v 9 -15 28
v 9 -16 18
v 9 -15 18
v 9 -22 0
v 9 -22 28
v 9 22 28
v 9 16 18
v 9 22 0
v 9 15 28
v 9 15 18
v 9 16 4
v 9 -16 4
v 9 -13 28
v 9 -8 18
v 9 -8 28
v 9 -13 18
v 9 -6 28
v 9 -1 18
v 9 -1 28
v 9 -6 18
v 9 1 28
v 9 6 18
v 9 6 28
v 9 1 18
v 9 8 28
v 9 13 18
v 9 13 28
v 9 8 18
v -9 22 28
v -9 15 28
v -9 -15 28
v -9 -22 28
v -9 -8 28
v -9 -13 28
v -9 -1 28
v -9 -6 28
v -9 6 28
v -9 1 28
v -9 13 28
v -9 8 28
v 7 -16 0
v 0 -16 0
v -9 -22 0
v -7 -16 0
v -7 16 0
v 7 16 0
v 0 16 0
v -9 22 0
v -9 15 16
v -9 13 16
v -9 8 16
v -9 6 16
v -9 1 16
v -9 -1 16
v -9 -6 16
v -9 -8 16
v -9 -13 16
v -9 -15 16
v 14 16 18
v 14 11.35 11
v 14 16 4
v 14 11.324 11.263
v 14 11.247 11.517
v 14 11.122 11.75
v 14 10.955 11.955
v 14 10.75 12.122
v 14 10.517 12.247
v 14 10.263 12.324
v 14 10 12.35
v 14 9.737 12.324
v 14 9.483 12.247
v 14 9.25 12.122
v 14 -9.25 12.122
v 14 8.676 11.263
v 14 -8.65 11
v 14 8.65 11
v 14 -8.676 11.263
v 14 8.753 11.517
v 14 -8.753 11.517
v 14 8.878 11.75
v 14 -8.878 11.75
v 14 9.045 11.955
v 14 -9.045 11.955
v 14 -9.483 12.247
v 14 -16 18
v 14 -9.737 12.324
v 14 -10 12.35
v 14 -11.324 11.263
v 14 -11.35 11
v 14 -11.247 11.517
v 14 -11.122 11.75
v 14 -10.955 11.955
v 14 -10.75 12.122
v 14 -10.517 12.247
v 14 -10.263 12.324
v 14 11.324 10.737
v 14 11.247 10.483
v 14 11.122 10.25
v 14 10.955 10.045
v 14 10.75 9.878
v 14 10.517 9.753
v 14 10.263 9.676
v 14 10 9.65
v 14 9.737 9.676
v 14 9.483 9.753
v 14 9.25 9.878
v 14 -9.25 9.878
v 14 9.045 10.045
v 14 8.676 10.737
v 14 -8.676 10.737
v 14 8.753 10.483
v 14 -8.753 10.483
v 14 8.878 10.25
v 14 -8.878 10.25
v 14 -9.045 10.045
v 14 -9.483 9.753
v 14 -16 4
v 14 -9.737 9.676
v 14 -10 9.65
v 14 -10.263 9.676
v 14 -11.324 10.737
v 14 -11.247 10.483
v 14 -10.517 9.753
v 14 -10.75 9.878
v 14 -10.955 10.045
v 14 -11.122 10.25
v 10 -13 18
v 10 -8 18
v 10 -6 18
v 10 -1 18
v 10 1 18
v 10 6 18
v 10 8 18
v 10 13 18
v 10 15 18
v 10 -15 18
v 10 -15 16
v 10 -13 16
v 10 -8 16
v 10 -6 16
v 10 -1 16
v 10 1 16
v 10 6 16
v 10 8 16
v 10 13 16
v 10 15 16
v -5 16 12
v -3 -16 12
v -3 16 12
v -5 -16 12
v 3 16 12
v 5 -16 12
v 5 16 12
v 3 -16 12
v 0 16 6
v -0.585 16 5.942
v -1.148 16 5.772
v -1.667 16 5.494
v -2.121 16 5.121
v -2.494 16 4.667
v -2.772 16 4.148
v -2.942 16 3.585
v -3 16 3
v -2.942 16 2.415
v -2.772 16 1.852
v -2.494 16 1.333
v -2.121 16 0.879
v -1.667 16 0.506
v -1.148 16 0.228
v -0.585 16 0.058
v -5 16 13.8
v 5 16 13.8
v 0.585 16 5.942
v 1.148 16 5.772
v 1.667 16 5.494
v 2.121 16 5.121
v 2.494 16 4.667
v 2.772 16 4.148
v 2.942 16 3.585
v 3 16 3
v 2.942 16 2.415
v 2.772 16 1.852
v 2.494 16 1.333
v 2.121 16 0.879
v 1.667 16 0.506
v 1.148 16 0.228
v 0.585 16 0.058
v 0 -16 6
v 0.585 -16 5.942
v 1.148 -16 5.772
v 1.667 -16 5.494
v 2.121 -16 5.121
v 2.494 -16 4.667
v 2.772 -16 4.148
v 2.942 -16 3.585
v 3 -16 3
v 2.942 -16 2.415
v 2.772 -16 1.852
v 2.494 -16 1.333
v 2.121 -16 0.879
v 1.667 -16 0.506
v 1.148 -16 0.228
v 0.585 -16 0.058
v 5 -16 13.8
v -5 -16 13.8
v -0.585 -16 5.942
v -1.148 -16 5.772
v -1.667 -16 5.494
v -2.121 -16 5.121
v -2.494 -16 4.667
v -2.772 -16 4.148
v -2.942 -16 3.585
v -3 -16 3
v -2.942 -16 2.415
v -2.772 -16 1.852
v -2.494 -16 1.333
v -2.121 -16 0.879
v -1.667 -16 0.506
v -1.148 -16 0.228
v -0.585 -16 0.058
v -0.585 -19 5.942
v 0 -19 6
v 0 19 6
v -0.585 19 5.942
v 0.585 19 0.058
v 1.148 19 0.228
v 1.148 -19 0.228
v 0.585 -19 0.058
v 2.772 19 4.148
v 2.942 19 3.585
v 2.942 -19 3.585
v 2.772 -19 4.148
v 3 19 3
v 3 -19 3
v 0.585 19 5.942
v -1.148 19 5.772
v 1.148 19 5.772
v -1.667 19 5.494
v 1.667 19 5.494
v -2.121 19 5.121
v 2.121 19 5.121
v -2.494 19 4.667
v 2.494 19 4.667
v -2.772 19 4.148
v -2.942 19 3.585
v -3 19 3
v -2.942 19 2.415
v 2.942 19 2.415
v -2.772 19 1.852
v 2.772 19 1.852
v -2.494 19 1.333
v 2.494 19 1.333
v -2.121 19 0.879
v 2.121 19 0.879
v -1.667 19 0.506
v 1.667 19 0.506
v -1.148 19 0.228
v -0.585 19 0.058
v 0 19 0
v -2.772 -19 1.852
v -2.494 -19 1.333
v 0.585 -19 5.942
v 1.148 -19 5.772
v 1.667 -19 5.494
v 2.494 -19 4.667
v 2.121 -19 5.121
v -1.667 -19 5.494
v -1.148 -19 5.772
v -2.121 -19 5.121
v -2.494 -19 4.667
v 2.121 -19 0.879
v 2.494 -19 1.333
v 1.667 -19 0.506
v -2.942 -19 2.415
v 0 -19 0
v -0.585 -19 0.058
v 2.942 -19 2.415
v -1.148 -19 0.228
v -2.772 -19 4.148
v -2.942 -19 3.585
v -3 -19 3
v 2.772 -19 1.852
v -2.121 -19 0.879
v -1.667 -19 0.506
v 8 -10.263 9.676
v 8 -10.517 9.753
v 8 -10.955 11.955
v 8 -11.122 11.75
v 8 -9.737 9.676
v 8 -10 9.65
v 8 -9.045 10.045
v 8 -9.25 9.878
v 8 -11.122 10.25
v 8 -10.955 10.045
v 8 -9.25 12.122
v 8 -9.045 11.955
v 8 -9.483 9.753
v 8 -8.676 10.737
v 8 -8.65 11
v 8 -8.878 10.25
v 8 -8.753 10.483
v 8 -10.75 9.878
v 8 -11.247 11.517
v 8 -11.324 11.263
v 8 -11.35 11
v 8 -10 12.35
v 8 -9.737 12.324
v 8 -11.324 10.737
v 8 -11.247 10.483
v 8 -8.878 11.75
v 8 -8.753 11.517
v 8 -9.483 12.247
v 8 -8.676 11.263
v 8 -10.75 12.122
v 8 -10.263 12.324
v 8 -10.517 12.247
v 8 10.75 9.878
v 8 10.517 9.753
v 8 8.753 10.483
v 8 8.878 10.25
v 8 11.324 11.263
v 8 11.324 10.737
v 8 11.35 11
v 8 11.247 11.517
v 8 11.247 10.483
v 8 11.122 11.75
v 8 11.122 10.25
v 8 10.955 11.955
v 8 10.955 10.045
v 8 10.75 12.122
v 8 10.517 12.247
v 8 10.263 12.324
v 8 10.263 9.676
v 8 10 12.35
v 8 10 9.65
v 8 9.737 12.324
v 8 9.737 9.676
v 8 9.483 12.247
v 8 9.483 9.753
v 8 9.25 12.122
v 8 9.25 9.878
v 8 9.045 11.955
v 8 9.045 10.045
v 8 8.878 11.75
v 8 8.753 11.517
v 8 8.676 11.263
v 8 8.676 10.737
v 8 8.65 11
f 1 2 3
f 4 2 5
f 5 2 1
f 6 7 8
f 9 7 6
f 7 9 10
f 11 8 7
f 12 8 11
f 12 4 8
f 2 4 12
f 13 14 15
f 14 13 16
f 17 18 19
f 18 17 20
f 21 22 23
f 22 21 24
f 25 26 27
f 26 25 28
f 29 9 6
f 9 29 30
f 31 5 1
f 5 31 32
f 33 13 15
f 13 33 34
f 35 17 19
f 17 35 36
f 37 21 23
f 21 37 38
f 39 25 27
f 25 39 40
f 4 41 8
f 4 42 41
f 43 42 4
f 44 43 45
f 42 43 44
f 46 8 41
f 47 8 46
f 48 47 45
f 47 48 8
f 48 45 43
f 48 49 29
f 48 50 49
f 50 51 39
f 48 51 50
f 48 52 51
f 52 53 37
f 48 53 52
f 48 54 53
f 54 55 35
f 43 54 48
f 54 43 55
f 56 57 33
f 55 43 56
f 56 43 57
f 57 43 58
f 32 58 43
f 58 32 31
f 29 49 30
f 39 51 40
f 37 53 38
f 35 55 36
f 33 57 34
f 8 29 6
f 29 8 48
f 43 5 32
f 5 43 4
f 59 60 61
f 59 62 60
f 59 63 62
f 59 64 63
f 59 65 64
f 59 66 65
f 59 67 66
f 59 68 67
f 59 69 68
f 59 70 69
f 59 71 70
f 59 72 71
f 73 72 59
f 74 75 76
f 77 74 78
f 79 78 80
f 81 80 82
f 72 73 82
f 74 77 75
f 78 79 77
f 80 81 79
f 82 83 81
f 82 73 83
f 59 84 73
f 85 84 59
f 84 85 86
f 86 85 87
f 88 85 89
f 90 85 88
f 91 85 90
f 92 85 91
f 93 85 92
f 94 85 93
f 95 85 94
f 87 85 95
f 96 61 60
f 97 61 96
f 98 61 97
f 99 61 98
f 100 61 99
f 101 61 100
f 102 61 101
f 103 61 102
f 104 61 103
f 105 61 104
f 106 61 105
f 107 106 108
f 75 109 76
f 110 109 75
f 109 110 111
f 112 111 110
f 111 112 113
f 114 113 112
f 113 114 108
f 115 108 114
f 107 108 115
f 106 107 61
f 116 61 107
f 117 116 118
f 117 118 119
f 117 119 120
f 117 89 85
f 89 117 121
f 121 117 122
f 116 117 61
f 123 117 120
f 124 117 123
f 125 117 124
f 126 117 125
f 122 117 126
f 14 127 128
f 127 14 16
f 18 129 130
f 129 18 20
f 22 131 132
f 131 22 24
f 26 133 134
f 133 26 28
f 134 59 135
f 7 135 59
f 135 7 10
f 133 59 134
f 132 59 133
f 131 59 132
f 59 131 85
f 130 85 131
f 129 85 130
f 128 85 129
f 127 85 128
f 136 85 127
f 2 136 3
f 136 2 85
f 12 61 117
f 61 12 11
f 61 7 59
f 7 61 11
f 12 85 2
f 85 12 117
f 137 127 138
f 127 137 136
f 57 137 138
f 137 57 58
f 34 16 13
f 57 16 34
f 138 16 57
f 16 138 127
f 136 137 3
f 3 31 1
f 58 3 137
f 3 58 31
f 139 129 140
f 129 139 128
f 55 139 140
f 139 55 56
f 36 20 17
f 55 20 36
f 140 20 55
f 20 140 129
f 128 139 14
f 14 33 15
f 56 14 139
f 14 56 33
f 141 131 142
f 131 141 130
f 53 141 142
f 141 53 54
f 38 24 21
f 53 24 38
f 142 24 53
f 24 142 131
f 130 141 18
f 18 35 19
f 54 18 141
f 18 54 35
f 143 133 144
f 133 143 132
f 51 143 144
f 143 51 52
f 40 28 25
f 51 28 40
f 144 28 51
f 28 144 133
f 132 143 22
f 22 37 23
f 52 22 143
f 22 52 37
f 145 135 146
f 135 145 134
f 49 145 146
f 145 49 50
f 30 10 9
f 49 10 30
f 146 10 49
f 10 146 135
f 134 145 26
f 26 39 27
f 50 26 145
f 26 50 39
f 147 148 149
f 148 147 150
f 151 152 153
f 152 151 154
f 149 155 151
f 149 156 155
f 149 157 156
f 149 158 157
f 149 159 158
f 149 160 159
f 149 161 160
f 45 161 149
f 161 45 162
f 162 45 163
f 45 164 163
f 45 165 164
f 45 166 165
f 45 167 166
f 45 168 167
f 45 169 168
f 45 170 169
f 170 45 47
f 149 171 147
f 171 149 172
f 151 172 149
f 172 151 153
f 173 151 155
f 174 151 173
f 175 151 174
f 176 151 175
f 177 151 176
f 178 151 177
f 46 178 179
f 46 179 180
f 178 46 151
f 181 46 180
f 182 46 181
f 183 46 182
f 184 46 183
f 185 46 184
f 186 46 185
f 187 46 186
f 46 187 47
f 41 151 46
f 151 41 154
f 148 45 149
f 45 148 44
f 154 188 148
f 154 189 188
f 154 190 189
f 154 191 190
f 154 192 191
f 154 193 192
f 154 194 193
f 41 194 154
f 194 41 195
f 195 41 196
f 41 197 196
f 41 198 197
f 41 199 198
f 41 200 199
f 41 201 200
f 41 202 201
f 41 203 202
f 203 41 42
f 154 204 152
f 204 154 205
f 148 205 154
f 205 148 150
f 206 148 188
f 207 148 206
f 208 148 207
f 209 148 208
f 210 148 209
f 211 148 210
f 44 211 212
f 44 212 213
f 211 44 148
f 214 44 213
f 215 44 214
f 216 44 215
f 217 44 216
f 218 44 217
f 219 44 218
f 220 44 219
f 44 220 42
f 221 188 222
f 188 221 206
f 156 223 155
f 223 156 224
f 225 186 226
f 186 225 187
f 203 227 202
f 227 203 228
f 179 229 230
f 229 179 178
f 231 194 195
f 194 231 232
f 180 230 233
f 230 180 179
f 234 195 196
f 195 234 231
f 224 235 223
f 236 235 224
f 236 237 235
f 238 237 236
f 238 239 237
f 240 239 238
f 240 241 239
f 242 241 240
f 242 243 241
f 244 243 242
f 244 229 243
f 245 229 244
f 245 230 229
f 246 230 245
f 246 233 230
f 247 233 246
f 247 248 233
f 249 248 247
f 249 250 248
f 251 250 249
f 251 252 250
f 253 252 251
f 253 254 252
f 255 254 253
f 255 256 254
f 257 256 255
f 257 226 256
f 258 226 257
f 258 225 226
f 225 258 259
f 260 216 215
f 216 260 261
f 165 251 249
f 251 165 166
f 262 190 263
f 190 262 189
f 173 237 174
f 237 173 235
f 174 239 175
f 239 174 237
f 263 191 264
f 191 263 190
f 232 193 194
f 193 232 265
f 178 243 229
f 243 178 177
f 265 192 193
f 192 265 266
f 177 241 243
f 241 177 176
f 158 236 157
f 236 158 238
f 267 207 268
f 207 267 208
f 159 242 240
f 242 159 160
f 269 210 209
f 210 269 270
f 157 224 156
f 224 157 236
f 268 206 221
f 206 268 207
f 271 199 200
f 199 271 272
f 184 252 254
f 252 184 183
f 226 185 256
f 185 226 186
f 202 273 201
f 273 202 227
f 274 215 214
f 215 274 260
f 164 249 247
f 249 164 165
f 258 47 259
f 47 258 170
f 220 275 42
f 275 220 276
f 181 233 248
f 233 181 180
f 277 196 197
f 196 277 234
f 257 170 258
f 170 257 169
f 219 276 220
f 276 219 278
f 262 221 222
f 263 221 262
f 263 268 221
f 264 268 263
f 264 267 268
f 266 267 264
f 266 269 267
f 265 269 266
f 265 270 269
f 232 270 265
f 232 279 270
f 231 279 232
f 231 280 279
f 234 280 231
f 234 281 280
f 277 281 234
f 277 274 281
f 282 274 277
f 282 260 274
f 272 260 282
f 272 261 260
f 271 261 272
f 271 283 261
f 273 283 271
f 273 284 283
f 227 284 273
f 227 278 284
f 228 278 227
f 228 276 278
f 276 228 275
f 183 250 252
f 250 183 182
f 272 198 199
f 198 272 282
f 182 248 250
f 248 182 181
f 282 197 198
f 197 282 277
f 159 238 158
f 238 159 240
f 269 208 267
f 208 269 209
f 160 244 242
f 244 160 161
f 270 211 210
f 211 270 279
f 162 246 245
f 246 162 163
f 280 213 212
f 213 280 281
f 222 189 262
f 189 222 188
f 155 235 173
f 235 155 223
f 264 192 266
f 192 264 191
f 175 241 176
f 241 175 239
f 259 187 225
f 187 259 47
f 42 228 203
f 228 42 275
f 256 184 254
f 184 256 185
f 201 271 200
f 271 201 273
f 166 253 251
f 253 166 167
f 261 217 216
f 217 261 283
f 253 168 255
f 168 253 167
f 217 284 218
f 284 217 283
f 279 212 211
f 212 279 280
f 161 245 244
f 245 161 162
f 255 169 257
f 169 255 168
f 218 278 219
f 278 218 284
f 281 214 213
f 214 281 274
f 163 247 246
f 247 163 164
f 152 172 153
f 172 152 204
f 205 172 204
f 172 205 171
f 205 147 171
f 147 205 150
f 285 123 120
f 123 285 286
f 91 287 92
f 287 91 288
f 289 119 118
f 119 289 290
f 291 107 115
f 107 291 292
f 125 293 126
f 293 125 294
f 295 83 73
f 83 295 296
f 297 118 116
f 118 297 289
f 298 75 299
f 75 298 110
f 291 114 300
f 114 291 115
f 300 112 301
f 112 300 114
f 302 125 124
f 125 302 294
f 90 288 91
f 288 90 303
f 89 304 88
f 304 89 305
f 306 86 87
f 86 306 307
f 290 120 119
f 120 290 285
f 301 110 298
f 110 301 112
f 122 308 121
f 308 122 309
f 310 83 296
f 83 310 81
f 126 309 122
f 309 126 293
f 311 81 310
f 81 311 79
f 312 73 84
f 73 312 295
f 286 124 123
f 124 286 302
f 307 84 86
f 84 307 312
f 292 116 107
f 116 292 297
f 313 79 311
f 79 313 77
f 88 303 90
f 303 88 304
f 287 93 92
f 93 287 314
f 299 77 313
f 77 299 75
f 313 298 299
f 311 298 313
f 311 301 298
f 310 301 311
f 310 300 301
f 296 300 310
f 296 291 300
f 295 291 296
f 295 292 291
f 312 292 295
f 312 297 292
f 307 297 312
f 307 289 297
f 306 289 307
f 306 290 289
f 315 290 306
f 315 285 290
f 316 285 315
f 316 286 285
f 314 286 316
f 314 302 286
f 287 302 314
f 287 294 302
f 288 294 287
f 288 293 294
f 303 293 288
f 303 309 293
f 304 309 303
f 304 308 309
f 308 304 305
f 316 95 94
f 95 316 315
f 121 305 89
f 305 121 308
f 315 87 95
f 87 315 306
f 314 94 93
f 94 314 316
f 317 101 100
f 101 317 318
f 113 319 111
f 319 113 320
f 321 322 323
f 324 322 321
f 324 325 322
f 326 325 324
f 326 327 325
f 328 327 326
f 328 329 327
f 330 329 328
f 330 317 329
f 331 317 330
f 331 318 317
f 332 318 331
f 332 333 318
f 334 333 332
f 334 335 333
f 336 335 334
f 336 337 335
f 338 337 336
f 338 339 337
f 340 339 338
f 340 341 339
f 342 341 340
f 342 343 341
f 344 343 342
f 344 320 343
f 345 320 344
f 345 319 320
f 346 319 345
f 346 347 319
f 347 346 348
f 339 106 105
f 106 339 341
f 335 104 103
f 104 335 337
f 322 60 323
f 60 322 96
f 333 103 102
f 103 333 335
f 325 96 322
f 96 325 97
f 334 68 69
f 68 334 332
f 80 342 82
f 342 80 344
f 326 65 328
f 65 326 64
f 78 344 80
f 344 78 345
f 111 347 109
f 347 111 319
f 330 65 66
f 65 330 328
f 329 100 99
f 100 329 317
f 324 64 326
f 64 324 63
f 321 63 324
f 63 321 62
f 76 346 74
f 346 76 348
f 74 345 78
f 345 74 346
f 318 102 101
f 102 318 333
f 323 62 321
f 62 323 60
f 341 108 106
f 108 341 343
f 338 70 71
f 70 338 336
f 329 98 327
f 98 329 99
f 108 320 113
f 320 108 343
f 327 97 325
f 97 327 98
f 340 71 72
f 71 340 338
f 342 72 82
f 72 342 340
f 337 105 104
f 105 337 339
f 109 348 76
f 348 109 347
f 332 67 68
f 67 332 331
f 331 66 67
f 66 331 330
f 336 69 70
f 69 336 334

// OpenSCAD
// PROJECT W.A.L.L. - HYPER-ACTUATOR Mk-1: Dual In-Situ 395nm UV-LED Pinning Wing
// Drawing Ref: DWG-WALL-HACT-004 | Material: 6061-T6 Aluminum (Heatsink) & Quartz
// Emits 2.8 W/cm² Focused UV-A at 395nm to Instantly Freeze Droplets (Zero Vertical Sagging)
// Complies with ISO 2768-mK tolerances | Designed for FDM / CNC Manufacturing

$fn = 32;

module uv_pinning_wing(
    wing_w = 18.0,
    wing_l = 44.0,
    wing_h = 28.0,
    lens_dia = 6.0,
    lens_len = 36.0,
    led_pcb_w = 10.0,
    led_pcb_l = 32.0,
    led_pcb_t = 1.6
) {
    difference() {
        union() {
            // Main Extruded Aluminum Thermal Radiator Body
            translate([-wing_w/2, -wing_l/2, 0])
                cube([wing_w, wing_l, wing_h]);

            // Side Flange Attachment Lug with M2.5 Clearance Holes
            translate([wing_w/2, -wing_l/2 + 6.0, 4.0])
                cube([5.0, wing_l - 12.0, 14.0]);
        }

        // 1. Internal Focused Parabolic/Trapezoidal Optical Reflector Cavity
        translate([0, 0, -0.1]) {
            hull() {
                translate([-wing_w/2 + 2.0, -led_pcb_l/2, 0])
                    cube([wing_w - 4.0, led_pcb_l, 0.1]);
                translate([-3.0, -led_pcb_l/2, 12.0])
                    cube([6.0, led_pcb_l, 0.1]);
            }
        }

        // 2. 6mm Cylindrical Quartz Lens Retention Channel (Bottom Optical Exit)
        translate([0, 0, 3.0])
            rotate([90, 0, 0])
                cylinder(d=lens_dia, h=lens_len + 2, center=true);

        // 3. Aluminum Core MCPCB LED Recess & Thermal Interface Pocket
        translate([-led_pcb_w/2, -led_pcb_l/2, 12.0])
            cube([led_pcb_w, led_pcb_l, led_pcb_t + 0.2]);

        // 4. External Longitudinal Heat-Sink Cooling Flutes
        for (f = [-14, -7, 0, 7, 14]) {
            translate([-wing_w/2 - 1, f - 1.0, 16.0])
                cube([wing_w + 2, 2.0, wing_h - 14.0]);
        }

        // 5. 2x M2.5 Side Clamping Bolt Holes
        translate([wing_w/2 - 1, -10.0, 11.0])
            rotate([0, 90, 0])
                cylinder(d=2.7, h=8.0);
        translate([wing_w/2 - 1,  10.0, 11.0])
            rotate([0, 90, 0])
                cylinder(d=2.7, h=8.0);
    }
}

uv_pinning_wing();
